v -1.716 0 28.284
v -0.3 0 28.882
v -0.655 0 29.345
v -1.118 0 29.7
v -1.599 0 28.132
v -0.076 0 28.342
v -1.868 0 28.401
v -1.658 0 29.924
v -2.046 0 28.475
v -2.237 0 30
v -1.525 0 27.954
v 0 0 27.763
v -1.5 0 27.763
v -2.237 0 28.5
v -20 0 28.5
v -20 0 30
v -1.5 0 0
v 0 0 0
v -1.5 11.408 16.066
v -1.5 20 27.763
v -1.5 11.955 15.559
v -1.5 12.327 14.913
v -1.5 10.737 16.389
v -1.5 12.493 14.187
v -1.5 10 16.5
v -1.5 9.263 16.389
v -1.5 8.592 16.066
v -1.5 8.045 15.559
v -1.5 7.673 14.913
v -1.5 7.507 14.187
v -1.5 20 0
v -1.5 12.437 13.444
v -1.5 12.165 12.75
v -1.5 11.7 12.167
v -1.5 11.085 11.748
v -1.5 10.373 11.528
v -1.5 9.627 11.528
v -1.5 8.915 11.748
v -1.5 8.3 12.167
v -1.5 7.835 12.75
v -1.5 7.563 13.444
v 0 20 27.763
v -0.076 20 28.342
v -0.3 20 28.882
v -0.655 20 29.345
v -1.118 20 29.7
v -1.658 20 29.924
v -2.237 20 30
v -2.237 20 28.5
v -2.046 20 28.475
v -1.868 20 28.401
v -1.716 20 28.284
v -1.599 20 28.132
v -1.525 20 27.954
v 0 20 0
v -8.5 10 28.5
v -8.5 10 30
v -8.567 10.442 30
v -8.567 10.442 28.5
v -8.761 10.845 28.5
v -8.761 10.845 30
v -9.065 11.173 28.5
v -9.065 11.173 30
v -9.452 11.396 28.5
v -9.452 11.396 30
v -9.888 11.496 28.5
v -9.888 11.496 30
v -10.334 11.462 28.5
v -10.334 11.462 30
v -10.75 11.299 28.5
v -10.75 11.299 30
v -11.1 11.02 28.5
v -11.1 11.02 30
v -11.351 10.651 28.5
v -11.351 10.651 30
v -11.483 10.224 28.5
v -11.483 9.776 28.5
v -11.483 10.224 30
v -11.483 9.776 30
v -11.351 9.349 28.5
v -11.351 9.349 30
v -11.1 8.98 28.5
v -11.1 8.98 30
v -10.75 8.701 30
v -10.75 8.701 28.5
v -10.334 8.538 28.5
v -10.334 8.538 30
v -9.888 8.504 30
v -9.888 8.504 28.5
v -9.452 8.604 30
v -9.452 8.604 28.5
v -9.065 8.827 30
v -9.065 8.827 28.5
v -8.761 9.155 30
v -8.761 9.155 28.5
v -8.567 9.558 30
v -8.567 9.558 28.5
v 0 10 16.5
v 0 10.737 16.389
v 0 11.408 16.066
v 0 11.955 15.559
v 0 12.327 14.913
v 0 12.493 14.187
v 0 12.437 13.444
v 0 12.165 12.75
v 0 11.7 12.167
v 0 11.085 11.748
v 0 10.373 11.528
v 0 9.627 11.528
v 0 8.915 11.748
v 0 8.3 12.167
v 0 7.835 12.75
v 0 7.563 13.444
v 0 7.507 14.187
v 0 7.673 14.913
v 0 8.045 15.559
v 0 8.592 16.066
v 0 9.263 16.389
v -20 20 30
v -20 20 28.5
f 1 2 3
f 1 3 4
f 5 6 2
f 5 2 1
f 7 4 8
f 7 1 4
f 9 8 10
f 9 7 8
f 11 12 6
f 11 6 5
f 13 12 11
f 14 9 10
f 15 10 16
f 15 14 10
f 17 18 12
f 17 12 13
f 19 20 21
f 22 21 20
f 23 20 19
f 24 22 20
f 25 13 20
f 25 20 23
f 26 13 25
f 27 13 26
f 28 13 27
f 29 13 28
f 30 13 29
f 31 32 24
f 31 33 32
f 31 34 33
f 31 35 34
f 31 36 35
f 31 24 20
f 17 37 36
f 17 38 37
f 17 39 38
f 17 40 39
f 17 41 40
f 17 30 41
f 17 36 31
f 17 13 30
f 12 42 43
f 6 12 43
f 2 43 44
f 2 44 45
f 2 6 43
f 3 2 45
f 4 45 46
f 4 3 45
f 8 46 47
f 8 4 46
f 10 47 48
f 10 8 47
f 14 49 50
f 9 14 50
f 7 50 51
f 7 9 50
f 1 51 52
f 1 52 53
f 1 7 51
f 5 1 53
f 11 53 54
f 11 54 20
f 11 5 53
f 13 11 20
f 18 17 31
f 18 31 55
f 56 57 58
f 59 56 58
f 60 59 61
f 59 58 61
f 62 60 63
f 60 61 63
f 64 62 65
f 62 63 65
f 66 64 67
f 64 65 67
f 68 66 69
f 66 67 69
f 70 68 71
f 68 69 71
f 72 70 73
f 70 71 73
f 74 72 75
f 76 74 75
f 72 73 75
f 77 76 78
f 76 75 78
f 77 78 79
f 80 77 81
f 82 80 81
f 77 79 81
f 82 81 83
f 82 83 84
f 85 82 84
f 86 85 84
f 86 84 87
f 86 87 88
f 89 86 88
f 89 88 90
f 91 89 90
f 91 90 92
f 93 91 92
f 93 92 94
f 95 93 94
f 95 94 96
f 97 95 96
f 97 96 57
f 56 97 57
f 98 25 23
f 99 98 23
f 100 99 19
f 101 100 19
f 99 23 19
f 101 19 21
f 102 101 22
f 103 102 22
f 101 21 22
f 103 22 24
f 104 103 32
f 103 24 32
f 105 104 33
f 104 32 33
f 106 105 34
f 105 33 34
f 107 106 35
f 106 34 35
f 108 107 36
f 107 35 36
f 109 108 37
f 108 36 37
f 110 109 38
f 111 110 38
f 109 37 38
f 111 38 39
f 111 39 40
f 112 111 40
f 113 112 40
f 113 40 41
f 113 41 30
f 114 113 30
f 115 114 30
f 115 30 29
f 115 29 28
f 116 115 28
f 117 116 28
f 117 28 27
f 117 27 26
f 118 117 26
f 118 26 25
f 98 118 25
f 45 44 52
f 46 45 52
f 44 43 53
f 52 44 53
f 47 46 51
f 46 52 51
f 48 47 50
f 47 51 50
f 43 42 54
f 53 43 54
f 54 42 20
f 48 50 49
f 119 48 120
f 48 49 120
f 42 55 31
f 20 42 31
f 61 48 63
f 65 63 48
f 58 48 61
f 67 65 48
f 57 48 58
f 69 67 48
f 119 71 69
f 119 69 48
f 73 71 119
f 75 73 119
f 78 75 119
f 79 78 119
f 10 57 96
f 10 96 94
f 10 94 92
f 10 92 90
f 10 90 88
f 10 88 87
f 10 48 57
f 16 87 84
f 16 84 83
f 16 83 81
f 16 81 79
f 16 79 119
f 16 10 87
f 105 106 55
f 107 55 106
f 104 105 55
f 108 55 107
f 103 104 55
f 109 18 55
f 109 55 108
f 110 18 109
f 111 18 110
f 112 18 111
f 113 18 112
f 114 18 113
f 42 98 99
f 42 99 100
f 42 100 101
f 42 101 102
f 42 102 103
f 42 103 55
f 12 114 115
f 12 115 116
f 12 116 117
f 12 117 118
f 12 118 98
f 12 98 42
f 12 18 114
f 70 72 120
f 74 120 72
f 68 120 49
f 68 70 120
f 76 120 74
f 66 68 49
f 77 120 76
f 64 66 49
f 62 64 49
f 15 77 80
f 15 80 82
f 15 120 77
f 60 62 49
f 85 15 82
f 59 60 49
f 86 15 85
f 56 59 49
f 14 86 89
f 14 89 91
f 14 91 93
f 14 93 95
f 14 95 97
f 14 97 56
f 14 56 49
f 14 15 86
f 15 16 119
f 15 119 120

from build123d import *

# Parameters (mm, degrees)
BASE_FLANGE1_DEPTH              = 20
F_5_0MM_PRESS_DOWEL_HOLE1_D     = 5
F_3_0MM_PRESS_DOWEL_HOLE1_D     = 3
F_3_0MM_PRESS_DOWEL_HOLE2_D     = 3
F_3_0MM_PRESS_DOWEL_HOLE2_DEPTH = 6
F_3_0MM_PRESS_DOWEL_HOLE2_TIP   = 0.901290929


# Sheet-metal steps are written as plain solids
with BuildPart() as part:
    # Sketch1 → Base-Flange1 (new body)
    with BuildSketch(Plane(origin=(0, 0, 0), x_dir=(1, 0, 0), z_dir=(0, 1, 0))):
        with BuildLine():
            Line((0, 0), (0, -27.7634))
            ThreePointArc((0, -27.7634), (-0.655084973, -29.344915027), (-2.2366, -30))
            Line((-2.2366, -30), (-20, -30))
            Line((-20, -30), (-20, -28.5))
            Line((-20, -28.5), (-2.2366, -28.5))
            ThreePointArc((-2.2366, -28.5), (-1.715745145, -28.284254855), (-1.5, -27.7634))
            Line((-1.5, -27.7634), (-1.5, 0))
            Line((-1.5, 0), (0, 0))
        make_face()
    extrude(amount=BASE_FLANGE1_DEPTH)

    # Ø5.0mm Press Dowel Hole1 (through all)
    with Locations(Plane(origin=(0, 0, 0), x_dir=(0, 0, -1), z_dir=(1, 0, 0))):
        with Locations((-14, 10)):
            Hole(F_5_0MM_PRESS_DOWEL_HOLE1_D / 2)

    # Ø3.0mm Press Dowel Hole1 (through all)
    with Locations(Plane(origin=(0, 0, 28.5), x_dir=(-1, 0, 0), z_dir=(0, 0, -1))):
        with Locations((10, 10)):
            Hole(F_3_0MM_PRESS_DOWEL_HOLE1_D / 2)

    # Ø3.0mm Press Dowel Hole2
    with Locations(Plane(origin=(-166.531359221, -210.525513363, 30), x_dir=(0, 1, 0), z_dir=(0, 0, -1))):
        with Locations((220.525513363, 156.531359221), (102.525513363, 181.531359221), (102.525513363, 271.531359221), (89.19270005, 226.531359221), (210.525513363, 317.793651488), (230.525513363, 317.793651488), (252.525513363, 320.462332131), (232.525513363, 300.462332131), (252.525513363, 132.600386311), (232.525513363, 152.600386311), (111.286271896, 136.531359221), (91.286271896, 136.531359221), (41.525513363, 196.432813402), (13.525513363, 196.432813402), (41.525513363, 138.767959221), (13.525513363, 138.767959221), (41.525513363, 256.62990504), (13.525513363, 256.62990504), (41.525513363, 314.294759221), (13.525513363, 314.294759221)):
            Hole(F_3_0MM_PRESS_DOWEL_HOLE2_D / 2, depth=F_3_0MM_PRESS_DOWEL_HOLE2_DEPTH)
            with Locations((0, 0, -(F_3_0MM_PRESS_DOWEL_HOLE2_DEPTH + F_3_0MM_PRESS_DOWEL_HOLE2_TIP / 2))):  # 118° drill point
                Cone(0, F_3_0MM_PRESS_DOWEL_HOLE2_D / 2, F_3_0MM_PRESS_DOWEL_HOLE2_TIP, mode=Mode.SUBTRACT)


solid = part.part
